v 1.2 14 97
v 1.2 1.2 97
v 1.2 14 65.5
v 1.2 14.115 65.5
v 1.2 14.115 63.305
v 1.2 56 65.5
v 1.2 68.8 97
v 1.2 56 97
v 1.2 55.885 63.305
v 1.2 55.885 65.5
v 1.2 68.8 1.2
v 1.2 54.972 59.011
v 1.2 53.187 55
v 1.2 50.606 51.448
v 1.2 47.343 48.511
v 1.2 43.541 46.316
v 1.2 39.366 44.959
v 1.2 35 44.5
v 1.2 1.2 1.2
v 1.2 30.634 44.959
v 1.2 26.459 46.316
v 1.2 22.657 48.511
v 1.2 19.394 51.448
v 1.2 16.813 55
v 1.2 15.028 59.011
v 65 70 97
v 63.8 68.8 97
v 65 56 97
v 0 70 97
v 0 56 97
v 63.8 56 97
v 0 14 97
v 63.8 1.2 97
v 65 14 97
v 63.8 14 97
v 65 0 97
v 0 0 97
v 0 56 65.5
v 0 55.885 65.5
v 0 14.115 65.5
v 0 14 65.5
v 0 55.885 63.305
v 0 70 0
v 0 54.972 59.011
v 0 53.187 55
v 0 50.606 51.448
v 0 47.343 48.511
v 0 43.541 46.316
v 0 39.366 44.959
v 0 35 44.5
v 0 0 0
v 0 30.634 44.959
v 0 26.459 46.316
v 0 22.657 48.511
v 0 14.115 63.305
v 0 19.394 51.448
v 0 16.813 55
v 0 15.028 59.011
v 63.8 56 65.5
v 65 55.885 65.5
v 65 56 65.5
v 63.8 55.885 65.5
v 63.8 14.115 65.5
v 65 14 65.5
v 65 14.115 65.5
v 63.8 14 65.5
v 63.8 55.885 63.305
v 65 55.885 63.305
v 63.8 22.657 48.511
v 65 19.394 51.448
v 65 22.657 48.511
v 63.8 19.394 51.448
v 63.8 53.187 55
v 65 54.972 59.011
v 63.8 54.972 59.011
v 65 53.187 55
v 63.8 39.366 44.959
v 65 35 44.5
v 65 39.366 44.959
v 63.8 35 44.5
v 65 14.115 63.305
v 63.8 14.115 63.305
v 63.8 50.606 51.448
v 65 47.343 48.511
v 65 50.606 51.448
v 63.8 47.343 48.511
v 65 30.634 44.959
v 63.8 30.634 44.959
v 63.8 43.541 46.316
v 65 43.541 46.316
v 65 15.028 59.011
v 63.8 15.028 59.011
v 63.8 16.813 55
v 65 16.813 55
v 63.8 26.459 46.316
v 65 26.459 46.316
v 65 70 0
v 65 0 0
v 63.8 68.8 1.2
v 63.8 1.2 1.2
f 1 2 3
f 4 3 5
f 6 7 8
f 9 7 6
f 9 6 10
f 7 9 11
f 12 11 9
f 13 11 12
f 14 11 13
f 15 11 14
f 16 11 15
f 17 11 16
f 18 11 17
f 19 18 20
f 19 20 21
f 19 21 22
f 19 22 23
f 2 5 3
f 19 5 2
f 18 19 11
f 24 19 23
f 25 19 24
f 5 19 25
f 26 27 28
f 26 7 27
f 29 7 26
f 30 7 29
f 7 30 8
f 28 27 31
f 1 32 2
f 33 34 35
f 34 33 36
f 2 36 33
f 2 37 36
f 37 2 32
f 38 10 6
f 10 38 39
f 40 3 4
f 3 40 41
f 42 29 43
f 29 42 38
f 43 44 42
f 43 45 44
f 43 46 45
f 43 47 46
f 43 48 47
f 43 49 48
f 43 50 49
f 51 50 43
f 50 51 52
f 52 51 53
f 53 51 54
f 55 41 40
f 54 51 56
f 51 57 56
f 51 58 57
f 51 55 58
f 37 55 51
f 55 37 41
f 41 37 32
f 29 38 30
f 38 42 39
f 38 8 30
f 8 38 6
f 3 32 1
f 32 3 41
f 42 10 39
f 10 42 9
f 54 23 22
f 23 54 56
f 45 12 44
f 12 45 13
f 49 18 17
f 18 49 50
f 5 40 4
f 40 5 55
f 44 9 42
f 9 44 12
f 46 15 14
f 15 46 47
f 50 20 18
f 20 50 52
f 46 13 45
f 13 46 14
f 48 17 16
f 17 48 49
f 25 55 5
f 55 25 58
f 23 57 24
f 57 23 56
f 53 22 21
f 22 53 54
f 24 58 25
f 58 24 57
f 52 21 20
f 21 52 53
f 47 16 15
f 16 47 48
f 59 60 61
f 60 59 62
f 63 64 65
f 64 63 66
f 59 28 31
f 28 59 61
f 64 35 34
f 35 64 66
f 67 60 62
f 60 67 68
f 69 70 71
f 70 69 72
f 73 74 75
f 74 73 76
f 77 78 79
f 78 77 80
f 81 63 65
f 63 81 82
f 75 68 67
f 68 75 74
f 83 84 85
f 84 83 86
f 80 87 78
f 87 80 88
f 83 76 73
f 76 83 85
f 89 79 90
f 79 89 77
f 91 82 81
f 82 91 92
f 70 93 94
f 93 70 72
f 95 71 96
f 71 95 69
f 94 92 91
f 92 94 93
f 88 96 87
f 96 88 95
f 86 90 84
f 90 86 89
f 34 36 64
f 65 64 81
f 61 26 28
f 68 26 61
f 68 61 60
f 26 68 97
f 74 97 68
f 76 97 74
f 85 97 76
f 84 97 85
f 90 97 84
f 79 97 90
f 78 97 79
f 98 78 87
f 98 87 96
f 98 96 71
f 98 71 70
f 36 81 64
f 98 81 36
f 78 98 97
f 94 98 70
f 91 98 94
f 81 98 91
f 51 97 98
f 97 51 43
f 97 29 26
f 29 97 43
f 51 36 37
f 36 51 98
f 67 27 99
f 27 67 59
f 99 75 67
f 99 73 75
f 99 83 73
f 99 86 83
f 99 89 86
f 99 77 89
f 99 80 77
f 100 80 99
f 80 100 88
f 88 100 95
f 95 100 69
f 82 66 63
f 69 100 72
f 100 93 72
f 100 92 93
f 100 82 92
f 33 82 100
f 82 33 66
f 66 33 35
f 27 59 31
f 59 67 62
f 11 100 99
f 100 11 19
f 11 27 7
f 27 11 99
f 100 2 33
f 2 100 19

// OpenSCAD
module touchGap(width, height, material = 1.2) {
	translate([0, 0, -height]) {
		cube (size = [material, width, height]);
	
	translate([0, width /2, 0])
		rotate([0, 90, 0]) 
			cylinder(h = material, d = width);
	}
}

module hashedSquare(x, y, z = 1.2, space = 5) {
    angle = 30;
	steps = space + z;

	count = round((x + y) / steps) + 1;
	echo ("count:", count);
	echo ("steps:", steps);

    difference() {
        cube([x, y, z]);

		for (i = [0: 1: count]) {
			translate([i * steps, -z, 0])
				rotate([0, 0, angle])
					cube([z, y / cos(angle) + z *2, z]);
			translate([x - i * steps, -z, 0])
				rotate([0, 0, -angle])
					cube([z, y / cos(angle) + z *2, z]);
		}
    }
}

module cardBox_63x88(x = 100, touchGaps = [false, true, false, true]) {
	y = 70;
	z = 97;

	radius = y * 0.3;
	diameter = y * 0.6;

	material = 1.2;

	difference() {
		cube(size = [x, y, z]);
		
		translate([material, material, material])
			cube(size = [x - (material * 2), y - (material * 2), z - material]);
		
		translate([0, (y - diameter) /2, z])
			#touchGap(width = diameter, height = diameter * 0.75);

		translate([x -1.6, (y - diameter) /2, z])
			#touchGap(width = diameter, height = diameter * 0.75, material = 2);

	}
}

cardBox_63x88(x = 65);
